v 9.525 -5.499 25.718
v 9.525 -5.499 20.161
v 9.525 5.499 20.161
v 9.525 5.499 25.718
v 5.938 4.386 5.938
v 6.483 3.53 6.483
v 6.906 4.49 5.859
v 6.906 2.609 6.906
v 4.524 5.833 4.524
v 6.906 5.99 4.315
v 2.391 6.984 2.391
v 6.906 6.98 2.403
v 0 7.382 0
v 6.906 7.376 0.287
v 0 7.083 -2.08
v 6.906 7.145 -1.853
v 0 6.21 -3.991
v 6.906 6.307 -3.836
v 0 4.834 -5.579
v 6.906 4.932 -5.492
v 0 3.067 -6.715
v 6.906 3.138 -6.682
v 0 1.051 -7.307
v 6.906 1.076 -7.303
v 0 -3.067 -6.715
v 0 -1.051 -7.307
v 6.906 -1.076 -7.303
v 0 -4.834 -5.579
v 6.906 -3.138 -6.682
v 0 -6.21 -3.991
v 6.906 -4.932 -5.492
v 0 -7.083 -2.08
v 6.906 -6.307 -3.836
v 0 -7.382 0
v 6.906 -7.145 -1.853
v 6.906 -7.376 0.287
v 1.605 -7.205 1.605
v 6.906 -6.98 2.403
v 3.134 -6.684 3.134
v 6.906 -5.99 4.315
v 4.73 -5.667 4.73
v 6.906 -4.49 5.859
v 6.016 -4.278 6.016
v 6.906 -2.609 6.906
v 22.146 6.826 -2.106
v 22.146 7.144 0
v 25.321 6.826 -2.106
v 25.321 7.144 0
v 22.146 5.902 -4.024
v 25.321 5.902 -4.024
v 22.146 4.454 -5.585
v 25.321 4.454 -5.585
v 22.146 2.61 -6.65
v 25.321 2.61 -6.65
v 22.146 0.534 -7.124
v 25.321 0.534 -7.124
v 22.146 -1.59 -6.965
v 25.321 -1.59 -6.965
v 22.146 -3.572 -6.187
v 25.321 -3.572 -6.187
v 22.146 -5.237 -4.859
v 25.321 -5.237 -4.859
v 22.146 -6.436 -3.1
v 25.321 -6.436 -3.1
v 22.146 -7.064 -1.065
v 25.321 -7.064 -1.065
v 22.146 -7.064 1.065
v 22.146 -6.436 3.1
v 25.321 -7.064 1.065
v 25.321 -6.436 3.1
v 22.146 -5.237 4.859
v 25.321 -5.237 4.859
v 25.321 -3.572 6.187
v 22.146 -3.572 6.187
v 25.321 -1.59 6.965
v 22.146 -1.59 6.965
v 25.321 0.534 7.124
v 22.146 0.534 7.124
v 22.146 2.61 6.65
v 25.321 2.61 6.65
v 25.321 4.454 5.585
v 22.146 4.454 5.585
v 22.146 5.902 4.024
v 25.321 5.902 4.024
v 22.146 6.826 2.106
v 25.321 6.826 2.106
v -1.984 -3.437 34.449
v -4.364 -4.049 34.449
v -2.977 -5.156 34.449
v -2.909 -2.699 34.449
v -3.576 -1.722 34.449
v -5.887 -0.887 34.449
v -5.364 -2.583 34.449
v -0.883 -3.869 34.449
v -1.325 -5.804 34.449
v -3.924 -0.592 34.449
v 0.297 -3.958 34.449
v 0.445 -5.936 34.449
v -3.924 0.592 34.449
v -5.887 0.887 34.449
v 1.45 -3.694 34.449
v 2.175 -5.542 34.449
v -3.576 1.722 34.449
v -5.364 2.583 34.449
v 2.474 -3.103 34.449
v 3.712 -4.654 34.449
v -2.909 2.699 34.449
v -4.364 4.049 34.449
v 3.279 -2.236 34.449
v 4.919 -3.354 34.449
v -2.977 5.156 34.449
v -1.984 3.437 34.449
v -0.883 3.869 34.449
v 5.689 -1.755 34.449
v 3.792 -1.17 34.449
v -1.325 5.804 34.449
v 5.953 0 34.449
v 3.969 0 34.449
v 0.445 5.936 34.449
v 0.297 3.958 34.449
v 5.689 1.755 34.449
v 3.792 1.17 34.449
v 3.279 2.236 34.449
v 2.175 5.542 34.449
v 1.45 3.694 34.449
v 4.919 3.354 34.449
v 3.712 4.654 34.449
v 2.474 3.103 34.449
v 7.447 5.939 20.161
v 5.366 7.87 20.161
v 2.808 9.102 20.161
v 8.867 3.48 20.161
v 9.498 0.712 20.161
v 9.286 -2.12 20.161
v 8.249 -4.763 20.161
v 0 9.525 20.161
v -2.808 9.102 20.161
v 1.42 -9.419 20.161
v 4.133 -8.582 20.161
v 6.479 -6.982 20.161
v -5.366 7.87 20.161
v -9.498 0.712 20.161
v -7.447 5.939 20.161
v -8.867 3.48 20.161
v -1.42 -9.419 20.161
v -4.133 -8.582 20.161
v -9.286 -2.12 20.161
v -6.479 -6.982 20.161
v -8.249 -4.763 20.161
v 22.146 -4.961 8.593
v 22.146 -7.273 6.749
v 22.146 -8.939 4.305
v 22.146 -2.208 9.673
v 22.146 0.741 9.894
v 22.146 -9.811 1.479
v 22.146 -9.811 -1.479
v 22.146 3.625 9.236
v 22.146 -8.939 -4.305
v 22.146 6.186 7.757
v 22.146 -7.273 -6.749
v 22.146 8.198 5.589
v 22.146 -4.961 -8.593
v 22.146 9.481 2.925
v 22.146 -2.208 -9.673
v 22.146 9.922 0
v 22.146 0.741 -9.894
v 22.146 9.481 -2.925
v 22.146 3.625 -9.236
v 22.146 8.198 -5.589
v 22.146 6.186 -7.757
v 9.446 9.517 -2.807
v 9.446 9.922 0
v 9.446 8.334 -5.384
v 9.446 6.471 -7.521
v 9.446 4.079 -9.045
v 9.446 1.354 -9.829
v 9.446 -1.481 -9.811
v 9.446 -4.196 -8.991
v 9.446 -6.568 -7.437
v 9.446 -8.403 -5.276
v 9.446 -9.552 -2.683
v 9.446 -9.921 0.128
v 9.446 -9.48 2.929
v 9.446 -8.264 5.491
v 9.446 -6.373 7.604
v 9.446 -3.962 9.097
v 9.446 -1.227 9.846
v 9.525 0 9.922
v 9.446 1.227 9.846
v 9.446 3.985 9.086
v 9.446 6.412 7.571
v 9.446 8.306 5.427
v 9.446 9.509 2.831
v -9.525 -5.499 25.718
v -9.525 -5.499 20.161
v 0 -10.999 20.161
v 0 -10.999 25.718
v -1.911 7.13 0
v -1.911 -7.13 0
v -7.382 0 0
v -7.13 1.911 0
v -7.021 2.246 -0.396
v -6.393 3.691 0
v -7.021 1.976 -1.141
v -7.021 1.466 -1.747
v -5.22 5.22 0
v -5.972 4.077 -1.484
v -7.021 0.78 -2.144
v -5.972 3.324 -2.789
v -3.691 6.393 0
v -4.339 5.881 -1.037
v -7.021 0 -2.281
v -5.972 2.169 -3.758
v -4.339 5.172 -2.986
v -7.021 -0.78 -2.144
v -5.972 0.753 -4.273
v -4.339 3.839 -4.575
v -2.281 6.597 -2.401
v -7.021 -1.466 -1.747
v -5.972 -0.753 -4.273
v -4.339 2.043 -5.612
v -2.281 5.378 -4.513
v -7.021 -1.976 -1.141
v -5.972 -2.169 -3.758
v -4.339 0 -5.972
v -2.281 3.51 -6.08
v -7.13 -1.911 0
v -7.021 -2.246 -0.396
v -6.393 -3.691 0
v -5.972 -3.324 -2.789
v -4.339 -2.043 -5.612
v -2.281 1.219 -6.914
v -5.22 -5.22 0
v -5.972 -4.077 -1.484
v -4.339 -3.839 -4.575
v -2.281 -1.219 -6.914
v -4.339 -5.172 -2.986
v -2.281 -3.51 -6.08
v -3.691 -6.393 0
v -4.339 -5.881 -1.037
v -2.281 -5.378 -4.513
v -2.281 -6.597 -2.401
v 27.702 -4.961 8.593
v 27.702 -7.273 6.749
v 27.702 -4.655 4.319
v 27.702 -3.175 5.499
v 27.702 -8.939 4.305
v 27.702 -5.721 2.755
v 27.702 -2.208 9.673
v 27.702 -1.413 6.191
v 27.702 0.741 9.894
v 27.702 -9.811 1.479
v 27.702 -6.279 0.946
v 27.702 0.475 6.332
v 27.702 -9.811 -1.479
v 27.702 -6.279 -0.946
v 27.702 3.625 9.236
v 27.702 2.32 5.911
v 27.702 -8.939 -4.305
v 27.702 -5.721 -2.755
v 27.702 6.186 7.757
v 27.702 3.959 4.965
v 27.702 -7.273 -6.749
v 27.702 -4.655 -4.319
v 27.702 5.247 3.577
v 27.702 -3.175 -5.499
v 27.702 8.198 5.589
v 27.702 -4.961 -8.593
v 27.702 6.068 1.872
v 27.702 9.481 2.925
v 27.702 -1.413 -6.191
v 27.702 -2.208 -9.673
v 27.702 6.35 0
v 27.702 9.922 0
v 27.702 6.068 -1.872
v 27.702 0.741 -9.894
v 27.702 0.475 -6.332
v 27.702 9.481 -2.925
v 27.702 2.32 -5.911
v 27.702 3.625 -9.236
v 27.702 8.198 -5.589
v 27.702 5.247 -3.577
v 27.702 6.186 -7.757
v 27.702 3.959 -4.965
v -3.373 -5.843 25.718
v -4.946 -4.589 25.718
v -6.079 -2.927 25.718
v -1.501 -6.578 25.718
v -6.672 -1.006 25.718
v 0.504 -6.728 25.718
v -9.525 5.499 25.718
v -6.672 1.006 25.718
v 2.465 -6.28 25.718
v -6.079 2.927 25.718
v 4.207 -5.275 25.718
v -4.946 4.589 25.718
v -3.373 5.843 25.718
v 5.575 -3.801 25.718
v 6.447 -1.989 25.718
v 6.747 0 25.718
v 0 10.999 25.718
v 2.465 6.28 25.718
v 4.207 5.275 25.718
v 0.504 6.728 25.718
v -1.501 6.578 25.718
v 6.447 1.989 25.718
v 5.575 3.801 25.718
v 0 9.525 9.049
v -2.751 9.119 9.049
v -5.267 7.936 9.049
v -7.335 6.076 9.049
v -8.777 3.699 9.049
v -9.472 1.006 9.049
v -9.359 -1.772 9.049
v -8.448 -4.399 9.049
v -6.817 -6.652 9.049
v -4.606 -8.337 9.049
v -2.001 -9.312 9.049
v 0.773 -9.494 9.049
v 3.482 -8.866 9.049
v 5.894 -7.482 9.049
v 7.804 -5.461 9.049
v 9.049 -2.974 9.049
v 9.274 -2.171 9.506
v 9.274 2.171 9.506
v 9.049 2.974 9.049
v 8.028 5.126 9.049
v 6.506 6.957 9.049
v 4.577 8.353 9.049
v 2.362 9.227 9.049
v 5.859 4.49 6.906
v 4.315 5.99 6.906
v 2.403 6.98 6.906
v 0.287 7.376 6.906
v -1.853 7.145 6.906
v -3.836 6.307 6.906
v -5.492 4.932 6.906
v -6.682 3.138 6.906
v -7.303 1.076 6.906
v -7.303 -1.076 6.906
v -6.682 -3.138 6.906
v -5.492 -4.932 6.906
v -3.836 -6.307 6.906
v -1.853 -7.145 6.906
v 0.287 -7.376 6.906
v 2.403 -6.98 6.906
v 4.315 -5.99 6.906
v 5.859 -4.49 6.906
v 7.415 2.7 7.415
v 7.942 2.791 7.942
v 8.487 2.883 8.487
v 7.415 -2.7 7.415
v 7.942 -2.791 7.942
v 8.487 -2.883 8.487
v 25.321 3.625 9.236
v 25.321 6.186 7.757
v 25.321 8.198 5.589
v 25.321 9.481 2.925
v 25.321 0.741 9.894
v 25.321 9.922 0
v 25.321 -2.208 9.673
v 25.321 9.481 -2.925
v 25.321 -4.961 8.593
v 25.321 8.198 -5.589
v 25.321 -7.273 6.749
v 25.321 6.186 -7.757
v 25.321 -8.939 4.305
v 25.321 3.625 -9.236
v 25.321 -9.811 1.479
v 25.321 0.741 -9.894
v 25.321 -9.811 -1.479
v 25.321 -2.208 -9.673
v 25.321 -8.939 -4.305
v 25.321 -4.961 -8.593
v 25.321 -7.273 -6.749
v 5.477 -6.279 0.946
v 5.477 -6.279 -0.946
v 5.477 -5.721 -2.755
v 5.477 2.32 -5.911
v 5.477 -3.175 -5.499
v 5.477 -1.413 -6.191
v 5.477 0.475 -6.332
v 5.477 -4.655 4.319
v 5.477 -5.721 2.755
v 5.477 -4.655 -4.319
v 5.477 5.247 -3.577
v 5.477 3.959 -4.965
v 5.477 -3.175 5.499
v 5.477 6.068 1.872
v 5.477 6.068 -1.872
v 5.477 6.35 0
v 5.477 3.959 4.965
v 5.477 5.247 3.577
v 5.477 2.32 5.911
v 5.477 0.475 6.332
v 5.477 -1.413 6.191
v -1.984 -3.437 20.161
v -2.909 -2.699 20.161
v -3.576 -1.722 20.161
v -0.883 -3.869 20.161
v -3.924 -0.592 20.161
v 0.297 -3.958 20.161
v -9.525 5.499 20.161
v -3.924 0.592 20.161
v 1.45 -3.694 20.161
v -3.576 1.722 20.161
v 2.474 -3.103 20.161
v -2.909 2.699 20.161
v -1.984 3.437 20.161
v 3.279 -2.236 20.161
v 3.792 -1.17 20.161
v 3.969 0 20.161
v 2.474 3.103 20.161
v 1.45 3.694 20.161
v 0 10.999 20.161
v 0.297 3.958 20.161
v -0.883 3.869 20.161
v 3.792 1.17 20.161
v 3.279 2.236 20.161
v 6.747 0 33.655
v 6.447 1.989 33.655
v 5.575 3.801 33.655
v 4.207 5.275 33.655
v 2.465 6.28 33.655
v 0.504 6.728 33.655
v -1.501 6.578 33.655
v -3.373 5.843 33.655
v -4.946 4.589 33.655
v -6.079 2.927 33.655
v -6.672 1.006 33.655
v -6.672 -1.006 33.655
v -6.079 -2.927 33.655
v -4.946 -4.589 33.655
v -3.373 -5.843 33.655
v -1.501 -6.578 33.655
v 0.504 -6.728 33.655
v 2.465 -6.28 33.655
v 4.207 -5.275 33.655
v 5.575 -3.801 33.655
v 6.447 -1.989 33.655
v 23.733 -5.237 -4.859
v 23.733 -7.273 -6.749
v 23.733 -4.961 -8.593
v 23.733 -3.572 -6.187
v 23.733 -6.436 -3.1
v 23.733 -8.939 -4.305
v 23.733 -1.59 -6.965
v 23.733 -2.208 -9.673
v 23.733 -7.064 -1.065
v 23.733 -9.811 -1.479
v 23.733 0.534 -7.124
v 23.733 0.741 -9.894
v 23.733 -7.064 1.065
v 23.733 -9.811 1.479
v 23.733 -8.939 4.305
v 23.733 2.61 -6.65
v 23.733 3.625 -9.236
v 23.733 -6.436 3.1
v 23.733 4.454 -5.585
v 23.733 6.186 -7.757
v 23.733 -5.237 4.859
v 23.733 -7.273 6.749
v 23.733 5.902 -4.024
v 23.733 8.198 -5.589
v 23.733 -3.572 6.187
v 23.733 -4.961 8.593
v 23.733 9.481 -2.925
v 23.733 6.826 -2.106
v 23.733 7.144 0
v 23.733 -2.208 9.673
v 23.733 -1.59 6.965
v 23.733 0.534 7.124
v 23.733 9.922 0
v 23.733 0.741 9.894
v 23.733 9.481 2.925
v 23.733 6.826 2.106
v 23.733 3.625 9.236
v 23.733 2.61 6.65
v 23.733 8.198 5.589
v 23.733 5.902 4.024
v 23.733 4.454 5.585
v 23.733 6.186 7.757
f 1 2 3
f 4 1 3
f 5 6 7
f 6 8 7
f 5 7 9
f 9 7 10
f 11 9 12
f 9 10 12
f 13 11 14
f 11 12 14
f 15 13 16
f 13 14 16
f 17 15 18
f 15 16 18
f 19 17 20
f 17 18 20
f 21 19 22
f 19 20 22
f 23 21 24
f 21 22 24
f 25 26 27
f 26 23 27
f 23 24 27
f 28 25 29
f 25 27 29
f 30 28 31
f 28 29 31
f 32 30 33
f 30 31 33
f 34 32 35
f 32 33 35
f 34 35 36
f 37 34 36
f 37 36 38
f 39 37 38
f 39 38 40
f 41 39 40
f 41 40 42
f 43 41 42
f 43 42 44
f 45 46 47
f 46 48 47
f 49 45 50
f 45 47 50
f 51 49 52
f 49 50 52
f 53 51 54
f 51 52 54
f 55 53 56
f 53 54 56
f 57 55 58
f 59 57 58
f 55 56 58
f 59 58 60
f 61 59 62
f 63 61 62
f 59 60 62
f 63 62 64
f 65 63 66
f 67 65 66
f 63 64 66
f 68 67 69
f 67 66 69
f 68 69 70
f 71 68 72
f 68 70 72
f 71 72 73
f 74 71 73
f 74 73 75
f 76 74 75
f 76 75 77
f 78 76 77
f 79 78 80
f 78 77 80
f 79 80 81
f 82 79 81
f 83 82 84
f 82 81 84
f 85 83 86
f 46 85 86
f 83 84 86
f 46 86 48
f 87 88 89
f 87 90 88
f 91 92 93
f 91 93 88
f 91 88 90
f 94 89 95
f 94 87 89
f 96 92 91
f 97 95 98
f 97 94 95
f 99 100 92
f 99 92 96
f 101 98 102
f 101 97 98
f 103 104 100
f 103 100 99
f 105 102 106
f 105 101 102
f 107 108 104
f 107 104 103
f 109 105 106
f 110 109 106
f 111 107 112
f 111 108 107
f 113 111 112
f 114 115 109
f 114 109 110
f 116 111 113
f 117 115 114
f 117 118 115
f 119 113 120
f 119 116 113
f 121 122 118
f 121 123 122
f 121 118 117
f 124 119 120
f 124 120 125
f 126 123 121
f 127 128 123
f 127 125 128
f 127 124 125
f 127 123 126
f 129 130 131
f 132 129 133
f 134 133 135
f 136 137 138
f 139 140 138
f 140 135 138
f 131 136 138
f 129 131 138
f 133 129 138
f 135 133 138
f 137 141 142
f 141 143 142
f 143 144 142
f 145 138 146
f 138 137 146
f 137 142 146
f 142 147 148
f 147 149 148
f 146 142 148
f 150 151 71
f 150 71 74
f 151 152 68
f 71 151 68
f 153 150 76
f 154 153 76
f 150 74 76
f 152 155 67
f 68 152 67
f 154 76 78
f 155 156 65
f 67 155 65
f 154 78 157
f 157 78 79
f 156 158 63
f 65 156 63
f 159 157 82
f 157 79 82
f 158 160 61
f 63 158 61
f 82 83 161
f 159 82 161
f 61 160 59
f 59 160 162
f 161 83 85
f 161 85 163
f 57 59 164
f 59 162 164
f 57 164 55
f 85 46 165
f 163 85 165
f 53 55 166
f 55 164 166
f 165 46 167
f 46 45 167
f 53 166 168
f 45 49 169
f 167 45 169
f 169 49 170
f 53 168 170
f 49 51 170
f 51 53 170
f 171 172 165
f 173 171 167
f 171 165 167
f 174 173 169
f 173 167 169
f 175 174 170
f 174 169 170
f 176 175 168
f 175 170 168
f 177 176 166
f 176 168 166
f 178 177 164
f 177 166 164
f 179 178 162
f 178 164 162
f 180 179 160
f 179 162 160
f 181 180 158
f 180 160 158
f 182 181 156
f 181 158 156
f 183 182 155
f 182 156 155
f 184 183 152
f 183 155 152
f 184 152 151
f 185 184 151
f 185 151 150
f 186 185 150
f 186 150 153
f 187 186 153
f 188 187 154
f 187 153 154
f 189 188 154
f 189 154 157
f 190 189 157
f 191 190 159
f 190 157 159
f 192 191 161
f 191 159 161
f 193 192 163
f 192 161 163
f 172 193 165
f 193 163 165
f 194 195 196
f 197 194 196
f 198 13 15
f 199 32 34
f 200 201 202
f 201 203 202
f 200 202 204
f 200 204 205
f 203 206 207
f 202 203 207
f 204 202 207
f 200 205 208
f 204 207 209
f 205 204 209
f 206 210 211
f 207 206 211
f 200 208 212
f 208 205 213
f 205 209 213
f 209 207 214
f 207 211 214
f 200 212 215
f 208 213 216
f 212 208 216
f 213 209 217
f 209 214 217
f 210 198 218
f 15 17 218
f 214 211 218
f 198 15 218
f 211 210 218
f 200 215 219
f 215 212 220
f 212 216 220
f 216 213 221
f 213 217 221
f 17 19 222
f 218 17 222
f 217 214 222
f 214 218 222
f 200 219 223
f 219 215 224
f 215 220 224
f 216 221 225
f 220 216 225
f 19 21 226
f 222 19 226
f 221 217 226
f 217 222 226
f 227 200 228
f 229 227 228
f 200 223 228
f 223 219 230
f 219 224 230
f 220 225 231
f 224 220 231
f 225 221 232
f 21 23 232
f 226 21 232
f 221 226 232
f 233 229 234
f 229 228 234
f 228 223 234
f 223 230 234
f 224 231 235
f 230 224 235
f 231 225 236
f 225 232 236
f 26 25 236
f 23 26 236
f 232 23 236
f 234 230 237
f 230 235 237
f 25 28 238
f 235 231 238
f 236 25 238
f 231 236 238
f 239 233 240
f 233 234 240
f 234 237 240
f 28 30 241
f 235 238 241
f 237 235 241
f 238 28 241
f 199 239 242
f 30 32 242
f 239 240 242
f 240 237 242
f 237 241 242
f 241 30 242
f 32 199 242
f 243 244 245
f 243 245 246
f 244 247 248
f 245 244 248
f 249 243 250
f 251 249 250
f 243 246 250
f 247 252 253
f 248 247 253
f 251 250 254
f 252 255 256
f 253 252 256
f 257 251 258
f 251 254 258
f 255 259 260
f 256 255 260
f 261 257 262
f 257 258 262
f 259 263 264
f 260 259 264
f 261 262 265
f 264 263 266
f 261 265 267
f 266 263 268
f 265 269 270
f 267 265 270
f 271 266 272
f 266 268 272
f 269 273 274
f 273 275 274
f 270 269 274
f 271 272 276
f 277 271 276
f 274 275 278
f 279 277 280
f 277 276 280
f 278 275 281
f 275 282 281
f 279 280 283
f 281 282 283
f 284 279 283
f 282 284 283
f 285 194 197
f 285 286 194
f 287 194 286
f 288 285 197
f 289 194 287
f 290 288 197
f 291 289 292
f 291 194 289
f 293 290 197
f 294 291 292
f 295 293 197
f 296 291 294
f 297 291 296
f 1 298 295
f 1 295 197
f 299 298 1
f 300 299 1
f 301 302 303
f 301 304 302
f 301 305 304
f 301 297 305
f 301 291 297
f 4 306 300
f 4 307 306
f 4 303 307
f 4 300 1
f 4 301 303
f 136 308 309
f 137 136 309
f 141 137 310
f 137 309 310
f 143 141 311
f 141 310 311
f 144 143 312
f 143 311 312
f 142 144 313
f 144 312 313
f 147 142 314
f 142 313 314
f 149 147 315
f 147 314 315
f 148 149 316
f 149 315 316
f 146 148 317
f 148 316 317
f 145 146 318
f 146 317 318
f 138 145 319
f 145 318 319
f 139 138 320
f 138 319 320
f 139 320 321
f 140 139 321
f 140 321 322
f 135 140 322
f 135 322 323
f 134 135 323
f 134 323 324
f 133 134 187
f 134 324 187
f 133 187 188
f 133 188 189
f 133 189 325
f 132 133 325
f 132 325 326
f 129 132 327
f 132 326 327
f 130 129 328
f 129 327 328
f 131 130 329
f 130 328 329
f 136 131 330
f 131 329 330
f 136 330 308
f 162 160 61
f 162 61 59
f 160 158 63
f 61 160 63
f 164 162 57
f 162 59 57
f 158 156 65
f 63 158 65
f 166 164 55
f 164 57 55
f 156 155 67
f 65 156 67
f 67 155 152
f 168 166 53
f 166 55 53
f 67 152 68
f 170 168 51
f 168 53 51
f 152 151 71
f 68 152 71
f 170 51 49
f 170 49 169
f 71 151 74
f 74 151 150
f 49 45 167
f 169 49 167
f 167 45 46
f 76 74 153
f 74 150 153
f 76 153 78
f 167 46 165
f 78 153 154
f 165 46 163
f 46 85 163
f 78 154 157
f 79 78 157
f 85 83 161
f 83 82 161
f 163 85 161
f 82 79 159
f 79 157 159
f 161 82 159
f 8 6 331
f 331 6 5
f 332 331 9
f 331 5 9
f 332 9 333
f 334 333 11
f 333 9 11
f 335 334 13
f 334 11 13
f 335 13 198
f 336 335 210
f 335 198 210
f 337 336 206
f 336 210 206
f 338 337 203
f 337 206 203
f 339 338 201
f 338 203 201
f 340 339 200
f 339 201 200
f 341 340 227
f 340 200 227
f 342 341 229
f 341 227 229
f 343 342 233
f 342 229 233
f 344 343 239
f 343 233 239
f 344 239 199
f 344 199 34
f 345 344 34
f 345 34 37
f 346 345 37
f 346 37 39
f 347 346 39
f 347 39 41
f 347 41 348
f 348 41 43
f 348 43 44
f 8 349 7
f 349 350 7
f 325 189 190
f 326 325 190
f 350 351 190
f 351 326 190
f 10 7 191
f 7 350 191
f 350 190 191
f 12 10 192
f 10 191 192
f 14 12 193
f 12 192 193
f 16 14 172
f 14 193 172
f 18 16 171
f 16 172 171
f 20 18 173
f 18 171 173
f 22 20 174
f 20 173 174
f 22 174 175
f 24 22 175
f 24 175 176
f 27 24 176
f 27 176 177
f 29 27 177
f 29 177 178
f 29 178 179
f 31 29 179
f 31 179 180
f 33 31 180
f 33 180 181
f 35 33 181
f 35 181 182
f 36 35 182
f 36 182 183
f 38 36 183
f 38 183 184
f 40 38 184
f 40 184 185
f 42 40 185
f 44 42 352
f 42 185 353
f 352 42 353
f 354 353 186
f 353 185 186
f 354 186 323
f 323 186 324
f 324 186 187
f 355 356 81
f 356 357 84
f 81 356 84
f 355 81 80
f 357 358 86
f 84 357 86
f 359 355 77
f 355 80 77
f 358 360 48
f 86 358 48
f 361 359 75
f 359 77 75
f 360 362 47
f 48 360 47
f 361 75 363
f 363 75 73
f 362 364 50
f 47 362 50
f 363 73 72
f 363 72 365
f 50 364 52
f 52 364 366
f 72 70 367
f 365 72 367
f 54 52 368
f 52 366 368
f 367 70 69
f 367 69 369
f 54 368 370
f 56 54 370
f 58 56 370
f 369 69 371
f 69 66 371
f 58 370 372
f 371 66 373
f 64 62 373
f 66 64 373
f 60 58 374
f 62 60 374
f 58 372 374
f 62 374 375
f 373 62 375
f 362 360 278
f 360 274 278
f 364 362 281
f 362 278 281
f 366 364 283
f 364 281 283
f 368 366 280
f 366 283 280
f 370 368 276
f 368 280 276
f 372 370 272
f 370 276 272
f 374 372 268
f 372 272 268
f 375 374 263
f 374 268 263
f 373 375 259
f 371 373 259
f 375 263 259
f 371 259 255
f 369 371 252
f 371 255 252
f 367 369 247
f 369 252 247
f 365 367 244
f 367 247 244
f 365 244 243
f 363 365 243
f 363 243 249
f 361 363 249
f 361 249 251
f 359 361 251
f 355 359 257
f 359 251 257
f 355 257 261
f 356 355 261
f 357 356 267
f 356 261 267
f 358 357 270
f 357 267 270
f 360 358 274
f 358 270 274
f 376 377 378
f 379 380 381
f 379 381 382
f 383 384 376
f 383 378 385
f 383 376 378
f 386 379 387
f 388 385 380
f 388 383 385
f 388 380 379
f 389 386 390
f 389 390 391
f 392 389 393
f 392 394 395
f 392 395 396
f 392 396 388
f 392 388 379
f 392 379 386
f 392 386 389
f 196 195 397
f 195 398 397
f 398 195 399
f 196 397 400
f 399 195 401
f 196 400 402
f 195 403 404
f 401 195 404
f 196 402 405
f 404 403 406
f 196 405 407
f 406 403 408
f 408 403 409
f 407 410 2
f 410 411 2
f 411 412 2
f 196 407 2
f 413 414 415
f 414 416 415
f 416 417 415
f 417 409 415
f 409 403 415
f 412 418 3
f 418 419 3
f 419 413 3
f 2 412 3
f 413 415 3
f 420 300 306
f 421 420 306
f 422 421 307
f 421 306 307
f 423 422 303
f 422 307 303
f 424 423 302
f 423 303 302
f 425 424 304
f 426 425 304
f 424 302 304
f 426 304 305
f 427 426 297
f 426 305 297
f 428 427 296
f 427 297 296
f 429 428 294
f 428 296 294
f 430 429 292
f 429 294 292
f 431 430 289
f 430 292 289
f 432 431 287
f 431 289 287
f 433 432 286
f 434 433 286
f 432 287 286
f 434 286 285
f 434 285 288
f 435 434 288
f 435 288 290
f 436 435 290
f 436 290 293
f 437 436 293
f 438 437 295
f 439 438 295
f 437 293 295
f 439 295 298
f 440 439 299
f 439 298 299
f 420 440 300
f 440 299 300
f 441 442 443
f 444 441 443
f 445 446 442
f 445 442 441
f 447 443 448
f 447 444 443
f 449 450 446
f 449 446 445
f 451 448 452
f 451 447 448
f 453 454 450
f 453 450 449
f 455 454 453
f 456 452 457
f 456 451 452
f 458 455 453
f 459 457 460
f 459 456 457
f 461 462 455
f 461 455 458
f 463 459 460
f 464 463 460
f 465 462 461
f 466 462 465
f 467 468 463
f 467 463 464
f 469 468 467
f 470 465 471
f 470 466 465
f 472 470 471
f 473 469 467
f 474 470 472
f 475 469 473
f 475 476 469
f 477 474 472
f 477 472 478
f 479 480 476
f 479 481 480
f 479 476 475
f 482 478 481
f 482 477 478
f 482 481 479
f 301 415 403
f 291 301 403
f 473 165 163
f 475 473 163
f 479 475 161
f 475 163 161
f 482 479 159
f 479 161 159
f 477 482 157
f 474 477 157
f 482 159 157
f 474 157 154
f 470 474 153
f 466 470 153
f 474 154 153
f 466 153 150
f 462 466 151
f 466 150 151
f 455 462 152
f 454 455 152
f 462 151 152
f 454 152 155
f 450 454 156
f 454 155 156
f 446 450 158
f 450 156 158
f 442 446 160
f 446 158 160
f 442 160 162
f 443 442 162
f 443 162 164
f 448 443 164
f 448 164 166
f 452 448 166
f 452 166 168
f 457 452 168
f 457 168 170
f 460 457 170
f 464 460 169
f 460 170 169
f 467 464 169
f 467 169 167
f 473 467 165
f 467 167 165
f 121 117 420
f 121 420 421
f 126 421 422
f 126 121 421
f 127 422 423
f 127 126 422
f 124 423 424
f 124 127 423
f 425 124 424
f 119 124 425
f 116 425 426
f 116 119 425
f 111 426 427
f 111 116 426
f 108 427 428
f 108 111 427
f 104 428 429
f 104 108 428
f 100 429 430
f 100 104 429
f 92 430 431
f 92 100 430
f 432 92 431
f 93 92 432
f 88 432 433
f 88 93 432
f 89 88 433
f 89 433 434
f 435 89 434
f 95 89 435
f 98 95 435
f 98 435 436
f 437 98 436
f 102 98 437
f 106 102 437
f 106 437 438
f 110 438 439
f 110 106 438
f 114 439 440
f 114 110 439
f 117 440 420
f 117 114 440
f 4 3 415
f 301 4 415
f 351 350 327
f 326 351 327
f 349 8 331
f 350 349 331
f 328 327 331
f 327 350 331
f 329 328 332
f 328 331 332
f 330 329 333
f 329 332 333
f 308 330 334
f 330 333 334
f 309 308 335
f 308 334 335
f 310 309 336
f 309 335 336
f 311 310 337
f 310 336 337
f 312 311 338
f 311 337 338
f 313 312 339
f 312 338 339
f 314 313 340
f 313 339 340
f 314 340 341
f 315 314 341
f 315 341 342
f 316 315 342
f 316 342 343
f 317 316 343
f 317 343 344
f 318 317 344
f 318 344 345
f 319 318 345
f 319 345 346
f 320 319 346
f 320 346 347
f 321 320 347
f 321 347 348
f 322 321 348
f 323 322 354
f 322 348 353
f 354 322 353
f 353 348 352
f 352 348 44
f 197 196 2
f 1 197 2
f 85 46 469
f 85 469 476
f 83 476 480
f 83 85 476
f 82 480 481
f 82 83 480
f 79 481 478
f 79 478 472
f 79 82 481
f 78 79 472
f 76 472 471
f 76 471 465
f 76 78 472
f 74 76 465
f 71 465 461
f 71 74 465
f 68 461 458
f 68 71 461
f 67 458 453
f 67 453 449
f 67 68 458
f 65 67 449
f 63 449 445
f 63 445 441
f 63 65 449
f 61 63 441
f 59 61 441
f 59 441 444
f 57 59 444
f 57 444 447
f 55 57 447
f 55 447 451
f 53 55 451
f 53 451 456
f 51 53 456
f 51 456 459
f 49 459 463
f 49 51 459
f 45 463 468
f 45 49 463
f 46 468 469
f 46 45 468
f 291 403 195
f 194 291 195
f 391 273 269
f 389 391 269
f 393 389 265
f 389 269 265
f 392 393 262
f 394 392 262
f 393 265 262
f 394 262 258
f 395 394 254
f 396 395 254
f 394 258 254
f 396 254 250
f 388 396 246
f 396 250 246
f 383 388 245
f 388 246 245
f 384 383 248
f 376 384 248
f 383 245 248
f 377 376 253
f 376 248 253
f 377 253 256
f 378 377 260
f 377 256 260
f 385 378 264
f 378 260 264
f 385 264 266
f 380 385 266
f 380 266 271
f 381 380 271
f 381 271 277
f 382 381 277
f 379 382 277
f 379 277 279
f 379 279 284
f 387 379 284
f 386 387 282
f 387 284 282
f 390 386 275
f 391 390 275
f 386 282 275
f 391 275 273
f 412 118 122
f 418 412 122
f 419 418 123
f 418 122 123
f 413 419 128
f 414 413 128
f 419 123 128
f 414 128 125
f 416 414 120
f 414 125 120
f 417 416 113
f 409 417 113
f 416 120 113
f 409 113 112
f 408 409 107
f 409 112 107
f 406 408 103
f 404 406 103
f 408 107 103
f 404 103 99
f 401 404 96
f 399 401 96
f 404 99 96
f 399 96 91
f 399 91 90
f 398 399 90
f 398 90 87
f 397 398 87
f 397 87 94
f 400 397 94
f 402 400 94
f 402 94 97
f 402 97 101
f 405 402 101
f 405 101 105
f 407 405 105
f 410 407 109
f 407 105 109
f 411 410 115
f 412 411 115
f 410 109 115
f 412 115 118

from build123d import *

# Parameters (mm, degrees)
SKETCH2_R          = 9.921875
SKETCH2_R_2        = 7.14375
EXTRUDE1_DEPTH     = 1.5875
SKETCH7_R          = 6.35
CUT_EXTRUDE1_DEPTH = 22.225
EXTRUDE2_DEPTH     = 5.55625
SKETCH6_R          = 6.746875
EXTRUDE3_DEPTH     = 8.73125
CHAMFER1_SIZE      = 0.79375
SKETCH9_R          = 3.96875
CUT_EXTRUDE2_DEPTH = 14.2875


with BuildPart() as part:
    # Sketch1 → Revolve1 (revolve)
    with BuildSketch(Plane.XY):
        with BuildLine():
            Line((0, 7.381875), (6.905625, 7.381875))
            Line((6.905625, 7.381875), (9.445625, 9.921875))
            Line((9.445625, 9.921875), (22.145625, 9.921875))
            Line((22.145625, 9.921875), (22.145625, 7.14375))
            Line((22.145625, 7.14375), (25.320625, 7.14375))
            Line((25.320625, 7.14375), (25.320625, 9.921875))
            Line((25.320625, 9.921875), (27.701875, 9.921875))
            Line((27.701875, 9.921875), (27.701875, 0))
            Line((27.701875, 0), (-7.381875, 0))
            ThreePointArc((-7.381875, 0), (-5.21977387, 5.21977387), (0, 7.381875))
        make_face()
    revolve(axis=Axis((27.701875, 0, 0), (-1, 0, 0)))


with BuildPart() as revolve3_tool:
    # Sketch4 → Revolve3 (revolve)
    with BuildSketch(Plane(origin=(0, 0, 0), x_dir=(0, 0, -1), z_dir=(1, 0, 0))):
        with BuildLine():
            Line((7.381875, 0), (-20.16125, 0))
            Line((-20.16125, 0), (-20.16125, 9.525))
            Line((-20.16125, 9.525), (-9.04875, 9.525))
            Line((-9.04875, 9.525), (-6.905625, 7.381875))
            Line((-6.905625, 7.381875), (0, 7.381875))
            ThreePointArc((0, 7.381875), (5.21977387, 5.21977387), (7.381875, 0))
        make_face()
    revolve(axis=Axis((0, 0, -7.381875), (0, 0, 1)))


with BuildPart() as part_1:
    add(part.part)


with BuildPart() as part_2:
    # Revolve3: joined with revolve3_tool
    add(part_1.part.fuse(revolve3_tool.part, tol=0.00001))

    # Sketch7 → Cut-Extrude1 (cut)
    with BuildSketch(Plane(origin=(27.701875, 0, 0), x_dir=(0, 0, -1), z_dir=(1, 0, 0))):
        with Locations(Location((0, 0, 0), (0, 0, 90))):
            Circle(SKETCH7_R)
    extrude(amount=-CUT_EXTRUDE1_DEPTH, mode=Mode.SUBTRACT)


with BuildPart() as body_2:
    # Sketch2 → Extrude1 (new body)
    with BuildSketch(Plane(origin=(22.145625, 0, 0), x_dir=(0, 0, -1), z_dir=(1, 0, 0))):
        with Locations(Location((0, 0, 0), (0, 0, 90))):
            Circle(SKETCH2_R)
        with Locations(Location((0, 0, 0), (0, 0, 90))):
            Circle(SKETCH2_R_2, mode=Mode.SUBTRACT)
    extrude(amount=EXTRUDE1_DEPTH)


with BuildPart() as body_3:
    # Sketch5 → Extrude2 (new body)
    with BuildSketch(Plane.XY.offset(20.16125)):
        Polygon((0, 10.998522628), (-9.525, 5.499261314), (-9.525, -5.499261314), (0, -10.998522628), (9.525, -5.499261314), (9.525, 5.499261314), align=None)
    extrude(amount=EXTRUDE2_DEPTH)

    # Sketch6 → Extrude3 (add)
    with BuildSketch(Plane.XY.offset(25.7175)):
        Circle(SKETCH6_R)
    extrude(amount=EXTRUDE3_DEPTH)

    # Chamfer1
    chamfer1_edges = [body_3.edges().sort_by_distance(p)[0] for p in [
        (-6.746875, 0, 34.44875),
    ]]
    chamfer(chamfer1_edges, length=CHAMFER1_SIZE)

    # Sketch9 → Cut-Extrude2 (cut)
    with BuildSketch(Plane.XY.offset(34.44875)):
        Circle(SKETCH9_R)
    extrude(amount=-CUT_EXTRUDE2_DEPTH, mode=Mode.SUBTRACT)


solid = Compound([part_2.part, body_2.part, body_3.part])
